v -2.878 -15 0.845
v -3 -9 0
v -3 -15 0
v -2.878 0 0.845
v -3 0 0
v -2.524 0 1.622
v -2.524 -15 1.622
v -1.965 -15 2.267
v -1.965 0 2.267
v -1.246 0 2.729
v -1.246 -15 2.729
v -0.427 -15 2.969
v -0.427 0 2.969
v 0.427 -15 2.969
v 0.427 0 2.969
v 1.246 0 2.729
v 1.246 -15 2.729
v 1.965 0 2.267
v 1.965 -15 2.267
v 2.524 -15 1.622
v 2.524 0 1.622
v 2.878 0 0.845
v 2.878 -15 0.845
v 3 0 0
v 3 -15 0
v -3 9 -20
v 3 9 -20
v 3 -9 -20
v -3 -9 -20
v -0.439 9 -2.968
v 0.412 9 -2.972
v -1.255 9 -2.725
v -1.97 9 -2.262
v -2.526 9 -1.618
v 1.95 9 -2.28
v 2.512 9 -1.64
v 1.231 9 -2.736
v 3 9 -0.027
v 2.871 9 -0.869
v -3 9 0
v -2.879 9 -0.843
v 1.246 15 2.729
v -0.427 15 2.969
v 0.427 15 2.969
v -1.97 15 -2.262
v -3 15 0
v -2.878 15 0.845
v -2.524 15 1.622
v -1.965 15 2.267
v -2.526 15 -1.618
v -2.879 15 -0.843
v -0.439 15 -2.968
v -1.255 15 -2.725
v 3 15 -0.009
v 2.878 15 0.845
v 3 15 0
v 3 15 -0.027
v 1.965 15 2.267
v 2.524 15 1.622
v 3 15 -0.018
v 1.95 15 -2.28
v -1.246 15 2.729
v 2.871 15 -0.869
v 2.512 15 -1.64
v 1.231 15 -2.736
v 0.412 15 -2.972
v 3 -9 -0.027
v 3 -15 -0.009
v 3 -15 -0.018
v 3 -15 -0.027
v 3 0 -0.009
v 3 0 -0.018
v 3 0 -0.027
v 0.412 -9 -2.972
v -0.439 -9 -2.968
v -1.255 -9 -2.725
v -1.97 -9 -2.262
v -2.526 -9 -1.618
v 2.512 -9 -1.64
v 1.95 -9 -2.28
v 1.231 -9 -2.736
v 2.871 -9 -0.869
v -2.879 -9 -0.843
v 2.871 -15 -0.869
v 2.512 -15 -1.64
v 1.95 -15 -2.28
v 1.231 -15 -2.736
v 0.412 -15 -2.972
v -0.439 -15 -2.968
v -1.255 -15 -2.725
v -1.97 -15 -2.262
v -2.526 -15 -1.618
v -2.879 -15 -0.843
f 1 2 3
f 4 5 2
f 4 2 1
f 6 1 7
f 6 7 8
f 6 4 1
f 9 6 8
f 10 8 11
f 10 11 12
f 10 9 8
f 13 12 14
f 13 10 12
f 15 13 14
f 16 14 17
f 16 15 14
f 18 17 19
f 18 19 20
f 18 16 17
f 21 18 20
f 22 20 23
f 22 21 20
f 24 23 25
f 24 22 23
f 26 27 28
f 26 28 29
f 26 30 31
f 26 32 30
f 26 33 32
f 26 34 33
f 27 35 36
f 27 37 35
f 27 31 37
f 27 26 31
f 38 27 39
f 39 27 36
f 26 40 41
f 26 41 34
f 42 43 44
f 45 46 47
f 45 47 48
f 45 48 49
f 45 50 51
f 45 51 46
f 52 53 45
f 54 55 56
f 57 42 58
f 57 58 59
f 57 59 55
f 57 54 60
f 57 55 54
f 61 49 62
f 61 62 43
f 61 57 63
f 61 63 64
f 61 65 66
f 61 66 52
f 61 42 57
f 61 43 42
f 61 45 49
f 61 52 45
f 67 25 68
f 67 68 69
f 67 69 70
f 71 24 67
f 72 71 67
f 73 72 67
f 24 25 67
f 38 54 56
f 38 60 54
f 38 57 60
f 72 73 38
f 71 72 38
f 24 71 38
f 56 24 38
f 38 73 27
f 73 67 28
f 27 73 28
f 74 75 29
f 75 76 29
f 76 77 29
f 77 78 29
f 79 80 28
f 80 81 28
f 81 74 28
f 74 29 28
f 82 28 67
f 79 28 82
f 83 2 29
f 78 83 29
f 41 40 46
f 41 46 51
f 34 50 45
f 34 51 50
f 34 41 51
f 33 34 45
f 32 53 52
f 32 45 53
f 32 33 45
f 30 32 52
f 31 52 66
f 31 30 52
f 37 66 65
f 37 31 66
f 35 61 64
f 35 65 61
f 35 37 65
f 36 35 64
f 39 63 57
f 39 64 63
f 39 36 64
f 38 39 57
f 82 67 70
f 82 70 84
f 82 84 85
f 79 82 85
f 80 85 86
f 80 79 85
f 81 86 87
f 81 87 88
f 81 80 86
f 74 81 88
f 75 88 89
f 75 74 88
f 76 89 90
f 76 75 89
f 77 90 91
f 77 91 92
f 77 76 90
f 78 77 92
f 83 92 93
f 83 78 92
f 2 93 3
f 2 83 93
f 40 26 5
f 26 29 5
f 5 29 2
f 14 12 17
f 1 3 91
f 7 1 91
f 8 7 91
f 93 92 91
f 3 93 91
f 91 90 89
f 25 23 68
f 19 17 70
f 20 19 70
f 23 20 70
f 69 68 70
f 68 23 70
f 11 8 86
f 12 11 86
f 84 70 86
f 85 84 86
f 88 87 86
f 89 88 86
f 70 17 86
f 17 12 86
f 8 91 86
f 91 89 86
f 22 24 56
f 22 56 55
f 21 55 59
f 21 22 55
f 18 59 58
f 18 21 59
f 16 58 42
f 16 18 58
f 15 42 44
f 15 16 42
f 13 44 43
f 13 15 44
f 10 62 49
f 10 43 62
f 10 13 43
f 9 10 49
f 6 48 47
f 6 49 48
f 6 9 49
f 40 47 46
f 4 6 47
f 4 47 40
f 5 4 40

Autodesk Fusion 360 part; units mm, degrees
sketch "Sketch1" plane through (0, 0, 0) normal (0, 1, 0) x (1, 0, 0)
  circle A0 centre (0, 0) radius 3
  line L0 (2.9999, 0.0269) -> (3, 0.0269)
  line L1 (3, 0.0269) -> (3, 20)
  line L2 (3, 20) -> (-3, 20)
  line L3 (-3, 20) -> (-3, 0)
  dimension "d1" = 6
  dimension "d2" = 6
  dimension "d3" = 20
extrude "Extrude1" add sketch "Sketch1" along normal mid plane 30 contours A0 makes body 1
extrude "Extrude2" add sketch "Sketch1" along normal mid plane 18 contours A0 L1 L2 L3 bodies 1
copy_body "Body->Comp1" bodies 1 removing the originals makes body 2 in component "Component"
component "Component" placed x (1, 0, 0) y (0, 1, 0) z (0, 0, 1) at (0, 0, 0)
